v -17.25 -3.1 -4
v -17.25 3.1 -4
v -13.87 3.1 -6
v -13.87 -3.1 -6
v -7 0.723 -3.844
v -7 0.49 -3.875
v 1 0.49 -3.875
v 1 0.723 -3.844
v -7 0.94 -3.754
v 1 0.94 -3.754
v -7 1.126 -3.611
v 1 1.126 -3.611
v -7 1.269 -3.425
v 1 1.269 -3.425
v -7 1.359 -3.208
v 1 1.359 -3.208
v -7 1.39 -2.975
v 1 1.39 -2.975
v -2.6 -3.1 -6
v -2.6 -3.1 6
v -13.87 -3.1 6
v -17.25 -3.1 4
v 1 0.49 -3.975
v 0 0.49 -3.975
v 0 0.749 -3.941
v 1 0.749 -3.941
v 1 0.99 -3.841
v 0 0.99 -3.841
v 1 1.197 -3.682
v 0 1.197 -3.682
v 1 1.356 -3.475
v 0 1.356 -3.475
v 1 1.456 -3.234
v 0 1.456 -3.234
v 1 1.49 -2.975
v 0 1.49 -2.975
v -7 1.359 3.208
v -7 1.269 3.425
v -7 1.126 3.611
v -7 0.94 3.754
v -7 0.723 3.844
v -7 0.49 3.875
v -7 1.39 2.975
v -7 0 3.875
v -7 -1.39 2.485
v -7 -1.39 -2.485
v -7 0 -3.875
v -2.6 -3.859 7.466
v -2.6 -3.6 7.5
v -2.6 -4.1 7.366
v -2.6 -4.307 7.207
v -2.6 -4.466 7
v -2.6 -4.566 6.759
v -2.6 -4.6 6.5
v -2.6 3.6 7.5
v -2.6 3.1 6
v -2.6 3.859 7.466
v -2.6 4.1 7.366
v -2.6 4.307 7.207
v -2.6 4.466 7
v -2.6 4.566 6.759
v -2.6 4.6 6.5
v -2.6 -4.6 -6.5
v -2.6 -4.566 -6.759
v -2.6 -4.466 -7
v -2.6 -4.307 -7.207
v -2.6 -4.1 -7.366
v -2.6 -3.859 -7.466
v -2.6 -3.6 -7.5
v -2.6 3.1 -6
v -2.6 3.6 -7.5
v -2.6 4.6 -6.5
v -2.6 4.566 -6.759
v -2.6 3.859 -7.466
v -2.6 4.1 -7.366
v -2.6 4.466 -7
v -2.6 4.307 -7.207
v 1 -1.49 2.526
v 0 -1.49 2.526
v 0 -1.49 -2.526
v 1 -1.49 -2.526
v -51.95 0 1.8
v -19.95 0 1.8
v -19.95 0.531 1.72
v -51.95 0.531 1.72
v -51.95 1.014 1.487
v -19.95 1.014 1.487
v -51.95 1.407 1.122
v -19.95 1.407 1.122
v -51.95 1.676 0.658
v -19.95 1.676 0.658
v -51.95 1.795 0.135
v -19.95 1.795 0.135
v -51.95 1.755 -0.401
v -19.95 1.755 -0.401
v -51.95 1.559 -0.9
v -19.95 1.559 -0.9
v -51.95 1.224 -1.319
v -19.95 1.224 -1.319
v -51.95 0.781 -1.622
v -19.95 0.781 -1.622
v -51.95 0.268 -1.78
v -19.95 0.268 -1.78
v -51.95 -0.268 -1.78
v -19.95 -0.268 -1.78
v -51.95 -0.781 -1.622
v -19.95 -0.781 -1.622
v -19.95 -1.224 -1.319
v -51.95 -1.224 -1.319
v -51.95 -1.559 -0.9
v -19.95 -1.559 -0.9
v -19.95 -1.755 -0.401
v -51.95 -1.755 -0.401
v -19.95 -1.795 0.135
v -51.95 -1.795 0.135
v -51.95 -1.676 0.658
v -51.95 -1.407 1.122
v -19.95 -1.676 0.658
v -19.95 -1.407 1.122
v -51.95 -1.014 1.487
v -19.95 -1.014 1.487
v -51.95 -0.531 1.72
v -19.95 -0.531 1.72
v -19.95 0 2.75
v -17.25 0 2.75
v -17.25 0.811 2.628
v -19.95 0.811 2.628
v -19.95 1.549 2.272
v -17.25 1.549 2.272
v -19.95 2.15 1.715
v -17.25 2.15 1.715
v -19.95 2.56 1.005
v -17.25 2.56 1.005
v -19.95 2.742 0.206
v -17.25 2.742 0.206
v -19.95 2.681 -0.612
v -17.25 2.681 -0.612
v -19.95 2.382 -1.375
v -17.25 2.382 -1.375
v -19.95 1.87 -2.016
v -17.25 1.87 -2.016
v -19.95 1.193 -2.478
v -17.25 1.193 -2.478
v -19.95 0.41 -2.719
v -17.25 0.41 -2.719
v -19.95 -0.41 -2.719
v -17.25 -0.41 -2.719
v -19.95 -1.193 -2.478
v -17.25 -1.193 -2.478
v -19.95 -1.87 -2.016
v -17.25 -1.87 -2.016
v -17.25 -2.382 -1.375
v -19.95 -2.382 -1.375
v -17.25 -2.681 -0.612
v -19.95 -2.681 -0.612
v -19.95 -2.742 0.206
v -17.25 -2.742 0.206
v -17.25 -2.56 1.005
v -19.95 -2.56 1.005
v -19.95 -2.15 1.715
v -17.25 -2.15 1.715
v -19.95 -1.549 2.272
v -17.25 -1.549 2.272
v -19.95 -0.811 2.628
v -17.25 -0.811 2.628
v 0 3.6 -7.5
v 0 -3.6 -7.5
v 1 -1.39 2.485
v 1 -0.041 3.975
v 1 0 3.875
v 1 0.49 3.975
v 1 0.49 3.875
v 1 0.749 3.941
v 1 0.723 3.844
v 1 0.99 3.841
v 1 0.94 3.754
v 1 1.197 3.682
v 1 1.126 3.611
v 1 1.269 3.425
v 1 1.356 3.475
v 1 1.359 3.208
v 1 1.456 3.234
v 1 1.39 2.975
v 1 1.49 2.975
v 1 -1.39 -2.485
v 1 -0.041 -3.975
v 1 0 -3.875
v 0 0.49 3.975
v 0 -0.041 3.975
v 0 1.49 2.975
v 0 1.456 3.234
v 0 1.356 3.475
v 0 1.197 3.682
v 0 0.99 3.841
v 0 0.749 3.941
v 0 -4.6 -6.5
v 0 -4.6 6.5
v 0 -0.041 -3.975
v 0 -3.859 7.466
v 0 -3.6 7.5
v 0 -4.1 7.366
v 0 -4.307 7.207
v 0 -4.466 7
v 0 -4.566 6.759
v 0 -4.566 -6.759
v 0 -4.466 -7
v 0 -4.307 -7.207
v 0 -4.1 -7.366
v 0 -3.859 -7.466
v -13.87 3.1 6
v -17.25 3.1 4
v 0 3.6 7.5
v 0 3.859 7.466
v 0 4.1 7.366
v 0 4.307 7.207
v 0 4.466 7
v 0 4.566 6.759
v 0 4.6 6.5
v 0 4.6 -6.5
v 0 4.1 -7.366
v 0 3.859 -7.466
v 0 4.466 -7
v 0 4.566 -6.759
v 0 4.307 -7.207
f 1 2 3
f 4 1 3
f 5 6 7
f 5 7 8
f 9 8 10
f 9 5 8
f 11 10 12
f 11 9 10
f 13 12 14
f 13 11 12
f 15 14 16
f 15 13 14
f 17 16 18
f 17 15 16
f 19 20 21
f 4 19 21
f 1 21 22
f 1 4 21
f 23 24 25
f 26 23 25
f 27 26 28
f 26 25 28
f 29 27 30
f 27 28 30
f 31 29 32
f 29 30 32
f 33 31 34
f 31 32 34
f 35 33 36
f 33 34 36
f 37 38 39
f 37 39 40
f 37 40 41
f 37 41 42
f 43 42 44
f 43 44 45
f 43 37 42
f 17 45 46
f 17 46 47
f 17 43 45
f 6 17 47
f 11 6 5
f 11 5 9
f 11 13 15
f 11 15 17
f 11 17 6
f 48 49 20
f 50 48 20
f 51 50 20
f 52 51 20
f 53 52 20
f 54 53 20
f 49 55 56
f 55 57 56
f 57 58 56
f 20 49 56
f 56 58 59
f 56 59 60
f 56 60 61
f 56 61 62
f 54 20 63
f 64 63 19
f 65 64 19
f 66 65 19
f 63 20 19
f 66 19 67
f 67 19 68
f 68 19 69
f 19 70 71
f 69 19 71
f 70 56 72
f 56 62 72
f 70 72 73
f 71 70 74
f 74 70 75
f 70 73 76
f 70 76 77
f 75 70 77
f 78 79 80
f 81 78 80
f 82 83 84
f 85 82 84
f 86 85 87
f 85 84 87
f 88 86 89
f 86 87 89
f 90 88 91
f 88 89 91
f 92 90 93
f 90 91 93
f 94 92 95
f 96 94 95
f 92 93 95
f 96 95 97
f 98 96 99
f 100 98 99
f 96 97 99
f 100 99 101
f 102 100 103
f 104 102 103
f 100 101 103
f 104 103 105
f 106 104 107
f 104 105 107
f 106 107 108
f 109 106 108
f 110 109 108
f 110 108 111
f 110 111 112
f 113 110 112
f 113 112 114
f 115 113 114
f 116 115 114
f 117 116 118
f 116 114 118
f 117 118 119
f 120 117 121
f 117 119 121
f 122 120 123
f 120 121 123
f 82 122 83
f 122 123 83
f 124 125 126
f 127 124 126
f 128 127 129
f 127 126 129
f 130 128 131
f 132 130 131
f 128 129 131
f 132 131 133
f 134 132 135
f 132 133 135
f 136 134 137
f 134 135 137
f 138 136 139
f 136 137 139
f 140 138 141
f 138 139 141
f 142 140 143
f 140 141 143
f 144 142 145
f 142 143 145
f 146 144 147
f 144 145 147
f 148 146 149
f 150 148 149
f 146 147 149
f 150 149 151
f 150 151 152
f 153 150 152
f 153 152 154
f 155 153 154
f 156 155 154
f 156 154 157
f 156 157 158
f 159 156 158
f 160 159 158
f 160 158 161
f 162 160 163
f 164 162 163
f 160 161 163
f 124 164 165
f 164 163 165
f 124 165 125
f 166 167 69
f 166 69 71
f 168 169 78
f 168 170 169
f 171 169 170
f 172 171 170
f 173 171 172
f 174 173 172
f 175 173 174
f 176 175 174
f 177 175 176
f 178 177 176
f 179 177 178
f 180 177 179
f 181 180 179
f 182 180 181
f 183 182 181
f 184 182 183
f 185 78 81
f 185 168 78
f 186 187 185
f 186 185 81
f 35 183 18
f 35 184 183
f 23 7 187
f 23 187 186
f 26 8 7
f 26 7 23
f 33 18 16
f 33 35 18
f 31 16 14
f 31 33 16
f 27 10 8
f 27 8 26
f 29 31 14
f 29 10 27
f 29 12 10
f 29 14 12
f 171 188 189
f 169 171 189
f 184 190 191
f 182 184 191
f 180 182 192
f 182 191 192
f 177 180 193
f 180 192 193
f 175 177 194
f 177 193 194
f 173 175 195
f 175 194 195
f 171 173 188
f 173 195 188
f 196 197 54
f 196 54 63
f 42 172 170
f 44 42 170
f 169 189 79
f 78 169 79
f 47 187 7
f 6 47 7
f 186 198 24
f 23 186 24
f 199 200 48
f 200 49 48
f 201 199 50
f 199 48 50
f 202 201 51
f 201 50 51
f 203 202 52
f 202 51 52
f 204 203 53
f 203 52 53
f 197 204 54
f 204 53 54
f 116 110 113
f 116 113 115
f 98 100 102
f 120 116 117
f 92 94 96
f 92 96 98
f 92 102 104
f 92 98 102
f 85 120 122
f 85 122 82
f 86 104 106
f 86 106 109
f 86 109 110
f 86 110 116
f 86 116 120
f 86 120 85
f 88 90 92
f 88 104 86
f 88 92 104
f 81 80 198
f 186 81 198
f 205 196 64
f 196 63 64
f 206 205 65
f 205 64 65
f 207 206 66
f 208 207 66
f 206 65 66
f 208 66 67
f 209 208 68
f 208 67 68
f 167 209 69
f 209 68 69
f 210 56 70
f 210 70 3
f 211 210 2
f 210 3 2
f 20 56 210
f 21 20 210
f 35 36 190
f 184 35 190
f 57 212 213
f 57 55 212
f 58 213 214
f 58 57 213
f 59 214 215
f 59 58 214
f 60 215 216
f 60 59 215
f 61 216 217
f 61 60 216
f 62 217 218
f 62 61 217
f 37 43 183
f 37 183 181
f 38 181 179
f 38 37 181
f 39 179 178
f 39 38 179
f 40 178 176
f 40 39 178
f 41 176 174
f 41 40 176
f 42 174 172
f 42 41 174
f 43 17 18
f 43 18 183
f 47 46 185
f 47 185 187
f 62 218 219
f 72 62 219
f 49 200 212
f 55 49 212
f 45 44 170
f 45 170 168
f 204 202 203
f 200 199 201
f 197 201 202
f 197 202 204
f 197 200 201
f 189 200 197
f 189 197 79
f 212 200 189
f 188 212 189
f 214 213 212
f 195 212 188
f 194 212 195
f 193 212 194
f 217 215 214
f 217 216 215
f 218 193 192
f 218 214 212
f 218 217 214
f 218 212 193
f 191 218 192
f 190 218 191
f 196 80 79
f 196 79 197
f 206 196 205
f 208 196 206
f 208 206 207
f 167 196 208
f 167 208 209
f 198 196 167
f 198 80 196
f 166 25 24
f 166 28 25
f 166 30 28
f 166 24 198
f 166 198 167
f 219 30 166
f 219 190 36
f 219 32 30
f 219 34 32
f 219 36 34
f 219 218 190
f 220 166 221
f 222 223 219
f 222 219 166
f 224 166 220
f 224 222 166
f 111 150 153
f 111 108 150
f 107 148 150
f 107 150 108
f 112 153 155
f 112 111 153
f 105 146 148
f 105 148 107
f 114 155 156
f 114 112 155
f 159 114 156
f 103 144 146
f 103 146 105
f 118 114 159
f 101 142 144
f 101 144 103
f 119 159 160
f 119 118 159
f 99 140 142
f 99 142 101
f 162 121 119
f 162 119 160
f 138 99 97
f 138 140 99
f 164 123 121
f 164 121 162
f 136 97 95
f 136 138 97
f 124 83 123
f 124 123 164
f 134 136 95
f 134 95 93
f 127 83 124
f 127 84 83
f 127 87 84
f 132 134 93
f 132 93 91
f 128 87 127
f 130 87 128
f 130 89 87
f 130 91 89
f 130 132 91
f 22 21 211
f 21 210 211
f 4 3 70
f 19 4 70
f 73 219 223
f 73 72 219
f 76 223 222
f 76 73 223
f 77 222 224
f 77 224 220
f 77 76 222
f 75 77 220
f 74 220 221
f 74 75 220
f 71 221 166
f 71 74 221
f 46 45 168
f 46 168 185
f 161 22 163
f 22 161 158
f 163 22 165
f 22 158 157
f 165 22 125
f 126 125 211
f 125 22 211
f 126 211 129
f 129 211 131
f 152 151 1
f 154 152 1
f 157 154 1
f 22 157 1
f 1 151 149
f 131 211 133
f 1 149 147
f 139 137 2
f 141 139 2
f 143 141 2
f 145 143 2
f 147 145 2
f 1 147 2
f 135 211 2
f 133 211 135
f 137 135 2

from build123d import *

# Parameters (mm, degrees)
BOSS_EXTRUDE1_DEPTH = 3.1
SKETCH2_W           = 15
SKETCH2_H           = 9.2
BOSS_EXTRUDE2_DEPTH = 2.6
SKETCH3_R           = 2.75
BOSS_EXTRUDE3_DEPTH = 2.7
SKETCH4_R           = 1.8
BOSS_EXTRUDE4_DEPTH = 32
FILLET1_R           = 1
CUT_EXTRUDE1_DEPTH  = 7
BOSS_EXTRUDE5_DEPTH = 1


with BuildPart() as part:
    # Sketch1 → Boss-Extrude1 (new body, symmetric)
    with BuildSketch(Plane(origin=(0, 0, 0), x_dir=(1, 0, 0), z_dir=(0, 1, 0))):
        Polygon((0, 6), (0, -6), (-13.87, -6), (-17.25, -4), (-17.25, 4), (-13.87, 6), align=None)
    extrude(amount=BOSS_EXTRUDE1_DEPTH, both=True)

    # Sketch2 → Boss-Extrude2 (add)
    with BuildSketch(Plane(origin=(0, 0, 0), x_dir=(0, 0, -1), z_dir=(1, 0, 0))):
        Rectangle(SKETCH2_W, SKETCH2_H)
    extrude(amount=-BOSS_EXTRUDE2_DEPTH)

    # Sketch3 → Boss-Extrude3 (add)
    with BuildSketch(Plane.ZY.offset(17.25)):
        Circle(SKETCH3_R)
    extrude(amount=BOSS_EXTRUDE3_DEPTH)

    # Sketch4 → Boss-Extrude4 (add)
    with BuildSketch(Plane.ZY.offset(19.95)):
        Circle(SKETCH4_R)
    extrude(amount=BOSS_EXTRUDE4_DEPTH)

    # Fillet1
    fillet1_edges = [part.edges().sort_by_distance(p)[0] for p in [
        (-1.3, -4.6, 7.5),
        (-1.3, 4.6, 7.5),
        (-1.3, 4.6, -7.5),
        (-1.3, -4.6, -7.5),
    ]]
    fillet(fillet1_edges, radius=FILLET1_R)

    # Sketch5 → Cut-Extrude1 (cut)
    with BuildSketch(Plane(origin=(0, 0, 0), x_dir=(0, 0, -1), z_dir=(1, 0, 0))):
        with BuildLine():
            Line((2.975, 1.39), (-2.975, 1.39))
            ThreePointArc((-2.975, 1.39), (-3.611396103, 1.126396103), (-3.875, 0.49))
            Line((-3.875, 0.49), (-3.875, 0))
            Line((-3.875, 0), (-2.485, -1.39))
            Line((-2.485, -1.39), (2.485, -1.39))
            Line((2.485, -1.39), (3.875, 0))
            Line((3.875, 0), (3.875, 0.49))
            ThreePointArc((3.875, 0.49), (3.611396103, 1.126396103), (2.975, 1.39))
        make_face()
    extrude(amount=-CUT_EXTRUDE1_DEPTH, mode=Mode.SUBTRACT)

    # Sketch7 → Boss-Extrude5 (add)
    with BuildSketch(Plane(origin=(0, 0, 0), x_dir=(0, 0, -1), z_dir=(1, 0, 0))):
        with BuildLine():
            Line((2.975, 1.49), (-2.975, 1.49))
            ThreePointArc((-2.975, 1.49), (-3.682106781, 1.197106781), (-3.975, 0.49))
            Line((-3.975, 0.49), (-3.975, -0.041421356))
            Line((-3.975, -0.041421356), (-2.526421356, -1.49))
            Line((-2.526421356, -1.49), (2.526421356, -1.49))
            Line((2.526421356, -1.49), (3.975, -0.041421356))
            Line((3.975, -0.041421356), (3.975, 0.49))
            ThreePointArc((3.975, 0.49), (3.682106781, 1.197106781), (2.975, 1.49))
        make_face()
        with BuildLine():
            Line((-3.875, 0.49), (-3.875, 0))
            Line((-3.875, 0), (-2.485, -1.39))
            Line((-2.485, -1.39), (2.485, -1.39))
            Line((2.485, -1.39), (3.875, 0))
            Line((3.875, 0), (3.875, 0.49))
            ThreePointArc((3.875, 0.49), (3.611396103, 1.126396103), (2.975, 1.39))
            Line((2.975, 1.39), (-2.975, 1.39))
            ThreePointArc((-2.975, 1.39), (-3.611396103, 1.126396103), (-3.875, 0.49))
        make_face(mode=Mode.SUBTRACT)
    extrude(amount=BOSS_EXTRUDE5_DEPTH)


solid = part.part
